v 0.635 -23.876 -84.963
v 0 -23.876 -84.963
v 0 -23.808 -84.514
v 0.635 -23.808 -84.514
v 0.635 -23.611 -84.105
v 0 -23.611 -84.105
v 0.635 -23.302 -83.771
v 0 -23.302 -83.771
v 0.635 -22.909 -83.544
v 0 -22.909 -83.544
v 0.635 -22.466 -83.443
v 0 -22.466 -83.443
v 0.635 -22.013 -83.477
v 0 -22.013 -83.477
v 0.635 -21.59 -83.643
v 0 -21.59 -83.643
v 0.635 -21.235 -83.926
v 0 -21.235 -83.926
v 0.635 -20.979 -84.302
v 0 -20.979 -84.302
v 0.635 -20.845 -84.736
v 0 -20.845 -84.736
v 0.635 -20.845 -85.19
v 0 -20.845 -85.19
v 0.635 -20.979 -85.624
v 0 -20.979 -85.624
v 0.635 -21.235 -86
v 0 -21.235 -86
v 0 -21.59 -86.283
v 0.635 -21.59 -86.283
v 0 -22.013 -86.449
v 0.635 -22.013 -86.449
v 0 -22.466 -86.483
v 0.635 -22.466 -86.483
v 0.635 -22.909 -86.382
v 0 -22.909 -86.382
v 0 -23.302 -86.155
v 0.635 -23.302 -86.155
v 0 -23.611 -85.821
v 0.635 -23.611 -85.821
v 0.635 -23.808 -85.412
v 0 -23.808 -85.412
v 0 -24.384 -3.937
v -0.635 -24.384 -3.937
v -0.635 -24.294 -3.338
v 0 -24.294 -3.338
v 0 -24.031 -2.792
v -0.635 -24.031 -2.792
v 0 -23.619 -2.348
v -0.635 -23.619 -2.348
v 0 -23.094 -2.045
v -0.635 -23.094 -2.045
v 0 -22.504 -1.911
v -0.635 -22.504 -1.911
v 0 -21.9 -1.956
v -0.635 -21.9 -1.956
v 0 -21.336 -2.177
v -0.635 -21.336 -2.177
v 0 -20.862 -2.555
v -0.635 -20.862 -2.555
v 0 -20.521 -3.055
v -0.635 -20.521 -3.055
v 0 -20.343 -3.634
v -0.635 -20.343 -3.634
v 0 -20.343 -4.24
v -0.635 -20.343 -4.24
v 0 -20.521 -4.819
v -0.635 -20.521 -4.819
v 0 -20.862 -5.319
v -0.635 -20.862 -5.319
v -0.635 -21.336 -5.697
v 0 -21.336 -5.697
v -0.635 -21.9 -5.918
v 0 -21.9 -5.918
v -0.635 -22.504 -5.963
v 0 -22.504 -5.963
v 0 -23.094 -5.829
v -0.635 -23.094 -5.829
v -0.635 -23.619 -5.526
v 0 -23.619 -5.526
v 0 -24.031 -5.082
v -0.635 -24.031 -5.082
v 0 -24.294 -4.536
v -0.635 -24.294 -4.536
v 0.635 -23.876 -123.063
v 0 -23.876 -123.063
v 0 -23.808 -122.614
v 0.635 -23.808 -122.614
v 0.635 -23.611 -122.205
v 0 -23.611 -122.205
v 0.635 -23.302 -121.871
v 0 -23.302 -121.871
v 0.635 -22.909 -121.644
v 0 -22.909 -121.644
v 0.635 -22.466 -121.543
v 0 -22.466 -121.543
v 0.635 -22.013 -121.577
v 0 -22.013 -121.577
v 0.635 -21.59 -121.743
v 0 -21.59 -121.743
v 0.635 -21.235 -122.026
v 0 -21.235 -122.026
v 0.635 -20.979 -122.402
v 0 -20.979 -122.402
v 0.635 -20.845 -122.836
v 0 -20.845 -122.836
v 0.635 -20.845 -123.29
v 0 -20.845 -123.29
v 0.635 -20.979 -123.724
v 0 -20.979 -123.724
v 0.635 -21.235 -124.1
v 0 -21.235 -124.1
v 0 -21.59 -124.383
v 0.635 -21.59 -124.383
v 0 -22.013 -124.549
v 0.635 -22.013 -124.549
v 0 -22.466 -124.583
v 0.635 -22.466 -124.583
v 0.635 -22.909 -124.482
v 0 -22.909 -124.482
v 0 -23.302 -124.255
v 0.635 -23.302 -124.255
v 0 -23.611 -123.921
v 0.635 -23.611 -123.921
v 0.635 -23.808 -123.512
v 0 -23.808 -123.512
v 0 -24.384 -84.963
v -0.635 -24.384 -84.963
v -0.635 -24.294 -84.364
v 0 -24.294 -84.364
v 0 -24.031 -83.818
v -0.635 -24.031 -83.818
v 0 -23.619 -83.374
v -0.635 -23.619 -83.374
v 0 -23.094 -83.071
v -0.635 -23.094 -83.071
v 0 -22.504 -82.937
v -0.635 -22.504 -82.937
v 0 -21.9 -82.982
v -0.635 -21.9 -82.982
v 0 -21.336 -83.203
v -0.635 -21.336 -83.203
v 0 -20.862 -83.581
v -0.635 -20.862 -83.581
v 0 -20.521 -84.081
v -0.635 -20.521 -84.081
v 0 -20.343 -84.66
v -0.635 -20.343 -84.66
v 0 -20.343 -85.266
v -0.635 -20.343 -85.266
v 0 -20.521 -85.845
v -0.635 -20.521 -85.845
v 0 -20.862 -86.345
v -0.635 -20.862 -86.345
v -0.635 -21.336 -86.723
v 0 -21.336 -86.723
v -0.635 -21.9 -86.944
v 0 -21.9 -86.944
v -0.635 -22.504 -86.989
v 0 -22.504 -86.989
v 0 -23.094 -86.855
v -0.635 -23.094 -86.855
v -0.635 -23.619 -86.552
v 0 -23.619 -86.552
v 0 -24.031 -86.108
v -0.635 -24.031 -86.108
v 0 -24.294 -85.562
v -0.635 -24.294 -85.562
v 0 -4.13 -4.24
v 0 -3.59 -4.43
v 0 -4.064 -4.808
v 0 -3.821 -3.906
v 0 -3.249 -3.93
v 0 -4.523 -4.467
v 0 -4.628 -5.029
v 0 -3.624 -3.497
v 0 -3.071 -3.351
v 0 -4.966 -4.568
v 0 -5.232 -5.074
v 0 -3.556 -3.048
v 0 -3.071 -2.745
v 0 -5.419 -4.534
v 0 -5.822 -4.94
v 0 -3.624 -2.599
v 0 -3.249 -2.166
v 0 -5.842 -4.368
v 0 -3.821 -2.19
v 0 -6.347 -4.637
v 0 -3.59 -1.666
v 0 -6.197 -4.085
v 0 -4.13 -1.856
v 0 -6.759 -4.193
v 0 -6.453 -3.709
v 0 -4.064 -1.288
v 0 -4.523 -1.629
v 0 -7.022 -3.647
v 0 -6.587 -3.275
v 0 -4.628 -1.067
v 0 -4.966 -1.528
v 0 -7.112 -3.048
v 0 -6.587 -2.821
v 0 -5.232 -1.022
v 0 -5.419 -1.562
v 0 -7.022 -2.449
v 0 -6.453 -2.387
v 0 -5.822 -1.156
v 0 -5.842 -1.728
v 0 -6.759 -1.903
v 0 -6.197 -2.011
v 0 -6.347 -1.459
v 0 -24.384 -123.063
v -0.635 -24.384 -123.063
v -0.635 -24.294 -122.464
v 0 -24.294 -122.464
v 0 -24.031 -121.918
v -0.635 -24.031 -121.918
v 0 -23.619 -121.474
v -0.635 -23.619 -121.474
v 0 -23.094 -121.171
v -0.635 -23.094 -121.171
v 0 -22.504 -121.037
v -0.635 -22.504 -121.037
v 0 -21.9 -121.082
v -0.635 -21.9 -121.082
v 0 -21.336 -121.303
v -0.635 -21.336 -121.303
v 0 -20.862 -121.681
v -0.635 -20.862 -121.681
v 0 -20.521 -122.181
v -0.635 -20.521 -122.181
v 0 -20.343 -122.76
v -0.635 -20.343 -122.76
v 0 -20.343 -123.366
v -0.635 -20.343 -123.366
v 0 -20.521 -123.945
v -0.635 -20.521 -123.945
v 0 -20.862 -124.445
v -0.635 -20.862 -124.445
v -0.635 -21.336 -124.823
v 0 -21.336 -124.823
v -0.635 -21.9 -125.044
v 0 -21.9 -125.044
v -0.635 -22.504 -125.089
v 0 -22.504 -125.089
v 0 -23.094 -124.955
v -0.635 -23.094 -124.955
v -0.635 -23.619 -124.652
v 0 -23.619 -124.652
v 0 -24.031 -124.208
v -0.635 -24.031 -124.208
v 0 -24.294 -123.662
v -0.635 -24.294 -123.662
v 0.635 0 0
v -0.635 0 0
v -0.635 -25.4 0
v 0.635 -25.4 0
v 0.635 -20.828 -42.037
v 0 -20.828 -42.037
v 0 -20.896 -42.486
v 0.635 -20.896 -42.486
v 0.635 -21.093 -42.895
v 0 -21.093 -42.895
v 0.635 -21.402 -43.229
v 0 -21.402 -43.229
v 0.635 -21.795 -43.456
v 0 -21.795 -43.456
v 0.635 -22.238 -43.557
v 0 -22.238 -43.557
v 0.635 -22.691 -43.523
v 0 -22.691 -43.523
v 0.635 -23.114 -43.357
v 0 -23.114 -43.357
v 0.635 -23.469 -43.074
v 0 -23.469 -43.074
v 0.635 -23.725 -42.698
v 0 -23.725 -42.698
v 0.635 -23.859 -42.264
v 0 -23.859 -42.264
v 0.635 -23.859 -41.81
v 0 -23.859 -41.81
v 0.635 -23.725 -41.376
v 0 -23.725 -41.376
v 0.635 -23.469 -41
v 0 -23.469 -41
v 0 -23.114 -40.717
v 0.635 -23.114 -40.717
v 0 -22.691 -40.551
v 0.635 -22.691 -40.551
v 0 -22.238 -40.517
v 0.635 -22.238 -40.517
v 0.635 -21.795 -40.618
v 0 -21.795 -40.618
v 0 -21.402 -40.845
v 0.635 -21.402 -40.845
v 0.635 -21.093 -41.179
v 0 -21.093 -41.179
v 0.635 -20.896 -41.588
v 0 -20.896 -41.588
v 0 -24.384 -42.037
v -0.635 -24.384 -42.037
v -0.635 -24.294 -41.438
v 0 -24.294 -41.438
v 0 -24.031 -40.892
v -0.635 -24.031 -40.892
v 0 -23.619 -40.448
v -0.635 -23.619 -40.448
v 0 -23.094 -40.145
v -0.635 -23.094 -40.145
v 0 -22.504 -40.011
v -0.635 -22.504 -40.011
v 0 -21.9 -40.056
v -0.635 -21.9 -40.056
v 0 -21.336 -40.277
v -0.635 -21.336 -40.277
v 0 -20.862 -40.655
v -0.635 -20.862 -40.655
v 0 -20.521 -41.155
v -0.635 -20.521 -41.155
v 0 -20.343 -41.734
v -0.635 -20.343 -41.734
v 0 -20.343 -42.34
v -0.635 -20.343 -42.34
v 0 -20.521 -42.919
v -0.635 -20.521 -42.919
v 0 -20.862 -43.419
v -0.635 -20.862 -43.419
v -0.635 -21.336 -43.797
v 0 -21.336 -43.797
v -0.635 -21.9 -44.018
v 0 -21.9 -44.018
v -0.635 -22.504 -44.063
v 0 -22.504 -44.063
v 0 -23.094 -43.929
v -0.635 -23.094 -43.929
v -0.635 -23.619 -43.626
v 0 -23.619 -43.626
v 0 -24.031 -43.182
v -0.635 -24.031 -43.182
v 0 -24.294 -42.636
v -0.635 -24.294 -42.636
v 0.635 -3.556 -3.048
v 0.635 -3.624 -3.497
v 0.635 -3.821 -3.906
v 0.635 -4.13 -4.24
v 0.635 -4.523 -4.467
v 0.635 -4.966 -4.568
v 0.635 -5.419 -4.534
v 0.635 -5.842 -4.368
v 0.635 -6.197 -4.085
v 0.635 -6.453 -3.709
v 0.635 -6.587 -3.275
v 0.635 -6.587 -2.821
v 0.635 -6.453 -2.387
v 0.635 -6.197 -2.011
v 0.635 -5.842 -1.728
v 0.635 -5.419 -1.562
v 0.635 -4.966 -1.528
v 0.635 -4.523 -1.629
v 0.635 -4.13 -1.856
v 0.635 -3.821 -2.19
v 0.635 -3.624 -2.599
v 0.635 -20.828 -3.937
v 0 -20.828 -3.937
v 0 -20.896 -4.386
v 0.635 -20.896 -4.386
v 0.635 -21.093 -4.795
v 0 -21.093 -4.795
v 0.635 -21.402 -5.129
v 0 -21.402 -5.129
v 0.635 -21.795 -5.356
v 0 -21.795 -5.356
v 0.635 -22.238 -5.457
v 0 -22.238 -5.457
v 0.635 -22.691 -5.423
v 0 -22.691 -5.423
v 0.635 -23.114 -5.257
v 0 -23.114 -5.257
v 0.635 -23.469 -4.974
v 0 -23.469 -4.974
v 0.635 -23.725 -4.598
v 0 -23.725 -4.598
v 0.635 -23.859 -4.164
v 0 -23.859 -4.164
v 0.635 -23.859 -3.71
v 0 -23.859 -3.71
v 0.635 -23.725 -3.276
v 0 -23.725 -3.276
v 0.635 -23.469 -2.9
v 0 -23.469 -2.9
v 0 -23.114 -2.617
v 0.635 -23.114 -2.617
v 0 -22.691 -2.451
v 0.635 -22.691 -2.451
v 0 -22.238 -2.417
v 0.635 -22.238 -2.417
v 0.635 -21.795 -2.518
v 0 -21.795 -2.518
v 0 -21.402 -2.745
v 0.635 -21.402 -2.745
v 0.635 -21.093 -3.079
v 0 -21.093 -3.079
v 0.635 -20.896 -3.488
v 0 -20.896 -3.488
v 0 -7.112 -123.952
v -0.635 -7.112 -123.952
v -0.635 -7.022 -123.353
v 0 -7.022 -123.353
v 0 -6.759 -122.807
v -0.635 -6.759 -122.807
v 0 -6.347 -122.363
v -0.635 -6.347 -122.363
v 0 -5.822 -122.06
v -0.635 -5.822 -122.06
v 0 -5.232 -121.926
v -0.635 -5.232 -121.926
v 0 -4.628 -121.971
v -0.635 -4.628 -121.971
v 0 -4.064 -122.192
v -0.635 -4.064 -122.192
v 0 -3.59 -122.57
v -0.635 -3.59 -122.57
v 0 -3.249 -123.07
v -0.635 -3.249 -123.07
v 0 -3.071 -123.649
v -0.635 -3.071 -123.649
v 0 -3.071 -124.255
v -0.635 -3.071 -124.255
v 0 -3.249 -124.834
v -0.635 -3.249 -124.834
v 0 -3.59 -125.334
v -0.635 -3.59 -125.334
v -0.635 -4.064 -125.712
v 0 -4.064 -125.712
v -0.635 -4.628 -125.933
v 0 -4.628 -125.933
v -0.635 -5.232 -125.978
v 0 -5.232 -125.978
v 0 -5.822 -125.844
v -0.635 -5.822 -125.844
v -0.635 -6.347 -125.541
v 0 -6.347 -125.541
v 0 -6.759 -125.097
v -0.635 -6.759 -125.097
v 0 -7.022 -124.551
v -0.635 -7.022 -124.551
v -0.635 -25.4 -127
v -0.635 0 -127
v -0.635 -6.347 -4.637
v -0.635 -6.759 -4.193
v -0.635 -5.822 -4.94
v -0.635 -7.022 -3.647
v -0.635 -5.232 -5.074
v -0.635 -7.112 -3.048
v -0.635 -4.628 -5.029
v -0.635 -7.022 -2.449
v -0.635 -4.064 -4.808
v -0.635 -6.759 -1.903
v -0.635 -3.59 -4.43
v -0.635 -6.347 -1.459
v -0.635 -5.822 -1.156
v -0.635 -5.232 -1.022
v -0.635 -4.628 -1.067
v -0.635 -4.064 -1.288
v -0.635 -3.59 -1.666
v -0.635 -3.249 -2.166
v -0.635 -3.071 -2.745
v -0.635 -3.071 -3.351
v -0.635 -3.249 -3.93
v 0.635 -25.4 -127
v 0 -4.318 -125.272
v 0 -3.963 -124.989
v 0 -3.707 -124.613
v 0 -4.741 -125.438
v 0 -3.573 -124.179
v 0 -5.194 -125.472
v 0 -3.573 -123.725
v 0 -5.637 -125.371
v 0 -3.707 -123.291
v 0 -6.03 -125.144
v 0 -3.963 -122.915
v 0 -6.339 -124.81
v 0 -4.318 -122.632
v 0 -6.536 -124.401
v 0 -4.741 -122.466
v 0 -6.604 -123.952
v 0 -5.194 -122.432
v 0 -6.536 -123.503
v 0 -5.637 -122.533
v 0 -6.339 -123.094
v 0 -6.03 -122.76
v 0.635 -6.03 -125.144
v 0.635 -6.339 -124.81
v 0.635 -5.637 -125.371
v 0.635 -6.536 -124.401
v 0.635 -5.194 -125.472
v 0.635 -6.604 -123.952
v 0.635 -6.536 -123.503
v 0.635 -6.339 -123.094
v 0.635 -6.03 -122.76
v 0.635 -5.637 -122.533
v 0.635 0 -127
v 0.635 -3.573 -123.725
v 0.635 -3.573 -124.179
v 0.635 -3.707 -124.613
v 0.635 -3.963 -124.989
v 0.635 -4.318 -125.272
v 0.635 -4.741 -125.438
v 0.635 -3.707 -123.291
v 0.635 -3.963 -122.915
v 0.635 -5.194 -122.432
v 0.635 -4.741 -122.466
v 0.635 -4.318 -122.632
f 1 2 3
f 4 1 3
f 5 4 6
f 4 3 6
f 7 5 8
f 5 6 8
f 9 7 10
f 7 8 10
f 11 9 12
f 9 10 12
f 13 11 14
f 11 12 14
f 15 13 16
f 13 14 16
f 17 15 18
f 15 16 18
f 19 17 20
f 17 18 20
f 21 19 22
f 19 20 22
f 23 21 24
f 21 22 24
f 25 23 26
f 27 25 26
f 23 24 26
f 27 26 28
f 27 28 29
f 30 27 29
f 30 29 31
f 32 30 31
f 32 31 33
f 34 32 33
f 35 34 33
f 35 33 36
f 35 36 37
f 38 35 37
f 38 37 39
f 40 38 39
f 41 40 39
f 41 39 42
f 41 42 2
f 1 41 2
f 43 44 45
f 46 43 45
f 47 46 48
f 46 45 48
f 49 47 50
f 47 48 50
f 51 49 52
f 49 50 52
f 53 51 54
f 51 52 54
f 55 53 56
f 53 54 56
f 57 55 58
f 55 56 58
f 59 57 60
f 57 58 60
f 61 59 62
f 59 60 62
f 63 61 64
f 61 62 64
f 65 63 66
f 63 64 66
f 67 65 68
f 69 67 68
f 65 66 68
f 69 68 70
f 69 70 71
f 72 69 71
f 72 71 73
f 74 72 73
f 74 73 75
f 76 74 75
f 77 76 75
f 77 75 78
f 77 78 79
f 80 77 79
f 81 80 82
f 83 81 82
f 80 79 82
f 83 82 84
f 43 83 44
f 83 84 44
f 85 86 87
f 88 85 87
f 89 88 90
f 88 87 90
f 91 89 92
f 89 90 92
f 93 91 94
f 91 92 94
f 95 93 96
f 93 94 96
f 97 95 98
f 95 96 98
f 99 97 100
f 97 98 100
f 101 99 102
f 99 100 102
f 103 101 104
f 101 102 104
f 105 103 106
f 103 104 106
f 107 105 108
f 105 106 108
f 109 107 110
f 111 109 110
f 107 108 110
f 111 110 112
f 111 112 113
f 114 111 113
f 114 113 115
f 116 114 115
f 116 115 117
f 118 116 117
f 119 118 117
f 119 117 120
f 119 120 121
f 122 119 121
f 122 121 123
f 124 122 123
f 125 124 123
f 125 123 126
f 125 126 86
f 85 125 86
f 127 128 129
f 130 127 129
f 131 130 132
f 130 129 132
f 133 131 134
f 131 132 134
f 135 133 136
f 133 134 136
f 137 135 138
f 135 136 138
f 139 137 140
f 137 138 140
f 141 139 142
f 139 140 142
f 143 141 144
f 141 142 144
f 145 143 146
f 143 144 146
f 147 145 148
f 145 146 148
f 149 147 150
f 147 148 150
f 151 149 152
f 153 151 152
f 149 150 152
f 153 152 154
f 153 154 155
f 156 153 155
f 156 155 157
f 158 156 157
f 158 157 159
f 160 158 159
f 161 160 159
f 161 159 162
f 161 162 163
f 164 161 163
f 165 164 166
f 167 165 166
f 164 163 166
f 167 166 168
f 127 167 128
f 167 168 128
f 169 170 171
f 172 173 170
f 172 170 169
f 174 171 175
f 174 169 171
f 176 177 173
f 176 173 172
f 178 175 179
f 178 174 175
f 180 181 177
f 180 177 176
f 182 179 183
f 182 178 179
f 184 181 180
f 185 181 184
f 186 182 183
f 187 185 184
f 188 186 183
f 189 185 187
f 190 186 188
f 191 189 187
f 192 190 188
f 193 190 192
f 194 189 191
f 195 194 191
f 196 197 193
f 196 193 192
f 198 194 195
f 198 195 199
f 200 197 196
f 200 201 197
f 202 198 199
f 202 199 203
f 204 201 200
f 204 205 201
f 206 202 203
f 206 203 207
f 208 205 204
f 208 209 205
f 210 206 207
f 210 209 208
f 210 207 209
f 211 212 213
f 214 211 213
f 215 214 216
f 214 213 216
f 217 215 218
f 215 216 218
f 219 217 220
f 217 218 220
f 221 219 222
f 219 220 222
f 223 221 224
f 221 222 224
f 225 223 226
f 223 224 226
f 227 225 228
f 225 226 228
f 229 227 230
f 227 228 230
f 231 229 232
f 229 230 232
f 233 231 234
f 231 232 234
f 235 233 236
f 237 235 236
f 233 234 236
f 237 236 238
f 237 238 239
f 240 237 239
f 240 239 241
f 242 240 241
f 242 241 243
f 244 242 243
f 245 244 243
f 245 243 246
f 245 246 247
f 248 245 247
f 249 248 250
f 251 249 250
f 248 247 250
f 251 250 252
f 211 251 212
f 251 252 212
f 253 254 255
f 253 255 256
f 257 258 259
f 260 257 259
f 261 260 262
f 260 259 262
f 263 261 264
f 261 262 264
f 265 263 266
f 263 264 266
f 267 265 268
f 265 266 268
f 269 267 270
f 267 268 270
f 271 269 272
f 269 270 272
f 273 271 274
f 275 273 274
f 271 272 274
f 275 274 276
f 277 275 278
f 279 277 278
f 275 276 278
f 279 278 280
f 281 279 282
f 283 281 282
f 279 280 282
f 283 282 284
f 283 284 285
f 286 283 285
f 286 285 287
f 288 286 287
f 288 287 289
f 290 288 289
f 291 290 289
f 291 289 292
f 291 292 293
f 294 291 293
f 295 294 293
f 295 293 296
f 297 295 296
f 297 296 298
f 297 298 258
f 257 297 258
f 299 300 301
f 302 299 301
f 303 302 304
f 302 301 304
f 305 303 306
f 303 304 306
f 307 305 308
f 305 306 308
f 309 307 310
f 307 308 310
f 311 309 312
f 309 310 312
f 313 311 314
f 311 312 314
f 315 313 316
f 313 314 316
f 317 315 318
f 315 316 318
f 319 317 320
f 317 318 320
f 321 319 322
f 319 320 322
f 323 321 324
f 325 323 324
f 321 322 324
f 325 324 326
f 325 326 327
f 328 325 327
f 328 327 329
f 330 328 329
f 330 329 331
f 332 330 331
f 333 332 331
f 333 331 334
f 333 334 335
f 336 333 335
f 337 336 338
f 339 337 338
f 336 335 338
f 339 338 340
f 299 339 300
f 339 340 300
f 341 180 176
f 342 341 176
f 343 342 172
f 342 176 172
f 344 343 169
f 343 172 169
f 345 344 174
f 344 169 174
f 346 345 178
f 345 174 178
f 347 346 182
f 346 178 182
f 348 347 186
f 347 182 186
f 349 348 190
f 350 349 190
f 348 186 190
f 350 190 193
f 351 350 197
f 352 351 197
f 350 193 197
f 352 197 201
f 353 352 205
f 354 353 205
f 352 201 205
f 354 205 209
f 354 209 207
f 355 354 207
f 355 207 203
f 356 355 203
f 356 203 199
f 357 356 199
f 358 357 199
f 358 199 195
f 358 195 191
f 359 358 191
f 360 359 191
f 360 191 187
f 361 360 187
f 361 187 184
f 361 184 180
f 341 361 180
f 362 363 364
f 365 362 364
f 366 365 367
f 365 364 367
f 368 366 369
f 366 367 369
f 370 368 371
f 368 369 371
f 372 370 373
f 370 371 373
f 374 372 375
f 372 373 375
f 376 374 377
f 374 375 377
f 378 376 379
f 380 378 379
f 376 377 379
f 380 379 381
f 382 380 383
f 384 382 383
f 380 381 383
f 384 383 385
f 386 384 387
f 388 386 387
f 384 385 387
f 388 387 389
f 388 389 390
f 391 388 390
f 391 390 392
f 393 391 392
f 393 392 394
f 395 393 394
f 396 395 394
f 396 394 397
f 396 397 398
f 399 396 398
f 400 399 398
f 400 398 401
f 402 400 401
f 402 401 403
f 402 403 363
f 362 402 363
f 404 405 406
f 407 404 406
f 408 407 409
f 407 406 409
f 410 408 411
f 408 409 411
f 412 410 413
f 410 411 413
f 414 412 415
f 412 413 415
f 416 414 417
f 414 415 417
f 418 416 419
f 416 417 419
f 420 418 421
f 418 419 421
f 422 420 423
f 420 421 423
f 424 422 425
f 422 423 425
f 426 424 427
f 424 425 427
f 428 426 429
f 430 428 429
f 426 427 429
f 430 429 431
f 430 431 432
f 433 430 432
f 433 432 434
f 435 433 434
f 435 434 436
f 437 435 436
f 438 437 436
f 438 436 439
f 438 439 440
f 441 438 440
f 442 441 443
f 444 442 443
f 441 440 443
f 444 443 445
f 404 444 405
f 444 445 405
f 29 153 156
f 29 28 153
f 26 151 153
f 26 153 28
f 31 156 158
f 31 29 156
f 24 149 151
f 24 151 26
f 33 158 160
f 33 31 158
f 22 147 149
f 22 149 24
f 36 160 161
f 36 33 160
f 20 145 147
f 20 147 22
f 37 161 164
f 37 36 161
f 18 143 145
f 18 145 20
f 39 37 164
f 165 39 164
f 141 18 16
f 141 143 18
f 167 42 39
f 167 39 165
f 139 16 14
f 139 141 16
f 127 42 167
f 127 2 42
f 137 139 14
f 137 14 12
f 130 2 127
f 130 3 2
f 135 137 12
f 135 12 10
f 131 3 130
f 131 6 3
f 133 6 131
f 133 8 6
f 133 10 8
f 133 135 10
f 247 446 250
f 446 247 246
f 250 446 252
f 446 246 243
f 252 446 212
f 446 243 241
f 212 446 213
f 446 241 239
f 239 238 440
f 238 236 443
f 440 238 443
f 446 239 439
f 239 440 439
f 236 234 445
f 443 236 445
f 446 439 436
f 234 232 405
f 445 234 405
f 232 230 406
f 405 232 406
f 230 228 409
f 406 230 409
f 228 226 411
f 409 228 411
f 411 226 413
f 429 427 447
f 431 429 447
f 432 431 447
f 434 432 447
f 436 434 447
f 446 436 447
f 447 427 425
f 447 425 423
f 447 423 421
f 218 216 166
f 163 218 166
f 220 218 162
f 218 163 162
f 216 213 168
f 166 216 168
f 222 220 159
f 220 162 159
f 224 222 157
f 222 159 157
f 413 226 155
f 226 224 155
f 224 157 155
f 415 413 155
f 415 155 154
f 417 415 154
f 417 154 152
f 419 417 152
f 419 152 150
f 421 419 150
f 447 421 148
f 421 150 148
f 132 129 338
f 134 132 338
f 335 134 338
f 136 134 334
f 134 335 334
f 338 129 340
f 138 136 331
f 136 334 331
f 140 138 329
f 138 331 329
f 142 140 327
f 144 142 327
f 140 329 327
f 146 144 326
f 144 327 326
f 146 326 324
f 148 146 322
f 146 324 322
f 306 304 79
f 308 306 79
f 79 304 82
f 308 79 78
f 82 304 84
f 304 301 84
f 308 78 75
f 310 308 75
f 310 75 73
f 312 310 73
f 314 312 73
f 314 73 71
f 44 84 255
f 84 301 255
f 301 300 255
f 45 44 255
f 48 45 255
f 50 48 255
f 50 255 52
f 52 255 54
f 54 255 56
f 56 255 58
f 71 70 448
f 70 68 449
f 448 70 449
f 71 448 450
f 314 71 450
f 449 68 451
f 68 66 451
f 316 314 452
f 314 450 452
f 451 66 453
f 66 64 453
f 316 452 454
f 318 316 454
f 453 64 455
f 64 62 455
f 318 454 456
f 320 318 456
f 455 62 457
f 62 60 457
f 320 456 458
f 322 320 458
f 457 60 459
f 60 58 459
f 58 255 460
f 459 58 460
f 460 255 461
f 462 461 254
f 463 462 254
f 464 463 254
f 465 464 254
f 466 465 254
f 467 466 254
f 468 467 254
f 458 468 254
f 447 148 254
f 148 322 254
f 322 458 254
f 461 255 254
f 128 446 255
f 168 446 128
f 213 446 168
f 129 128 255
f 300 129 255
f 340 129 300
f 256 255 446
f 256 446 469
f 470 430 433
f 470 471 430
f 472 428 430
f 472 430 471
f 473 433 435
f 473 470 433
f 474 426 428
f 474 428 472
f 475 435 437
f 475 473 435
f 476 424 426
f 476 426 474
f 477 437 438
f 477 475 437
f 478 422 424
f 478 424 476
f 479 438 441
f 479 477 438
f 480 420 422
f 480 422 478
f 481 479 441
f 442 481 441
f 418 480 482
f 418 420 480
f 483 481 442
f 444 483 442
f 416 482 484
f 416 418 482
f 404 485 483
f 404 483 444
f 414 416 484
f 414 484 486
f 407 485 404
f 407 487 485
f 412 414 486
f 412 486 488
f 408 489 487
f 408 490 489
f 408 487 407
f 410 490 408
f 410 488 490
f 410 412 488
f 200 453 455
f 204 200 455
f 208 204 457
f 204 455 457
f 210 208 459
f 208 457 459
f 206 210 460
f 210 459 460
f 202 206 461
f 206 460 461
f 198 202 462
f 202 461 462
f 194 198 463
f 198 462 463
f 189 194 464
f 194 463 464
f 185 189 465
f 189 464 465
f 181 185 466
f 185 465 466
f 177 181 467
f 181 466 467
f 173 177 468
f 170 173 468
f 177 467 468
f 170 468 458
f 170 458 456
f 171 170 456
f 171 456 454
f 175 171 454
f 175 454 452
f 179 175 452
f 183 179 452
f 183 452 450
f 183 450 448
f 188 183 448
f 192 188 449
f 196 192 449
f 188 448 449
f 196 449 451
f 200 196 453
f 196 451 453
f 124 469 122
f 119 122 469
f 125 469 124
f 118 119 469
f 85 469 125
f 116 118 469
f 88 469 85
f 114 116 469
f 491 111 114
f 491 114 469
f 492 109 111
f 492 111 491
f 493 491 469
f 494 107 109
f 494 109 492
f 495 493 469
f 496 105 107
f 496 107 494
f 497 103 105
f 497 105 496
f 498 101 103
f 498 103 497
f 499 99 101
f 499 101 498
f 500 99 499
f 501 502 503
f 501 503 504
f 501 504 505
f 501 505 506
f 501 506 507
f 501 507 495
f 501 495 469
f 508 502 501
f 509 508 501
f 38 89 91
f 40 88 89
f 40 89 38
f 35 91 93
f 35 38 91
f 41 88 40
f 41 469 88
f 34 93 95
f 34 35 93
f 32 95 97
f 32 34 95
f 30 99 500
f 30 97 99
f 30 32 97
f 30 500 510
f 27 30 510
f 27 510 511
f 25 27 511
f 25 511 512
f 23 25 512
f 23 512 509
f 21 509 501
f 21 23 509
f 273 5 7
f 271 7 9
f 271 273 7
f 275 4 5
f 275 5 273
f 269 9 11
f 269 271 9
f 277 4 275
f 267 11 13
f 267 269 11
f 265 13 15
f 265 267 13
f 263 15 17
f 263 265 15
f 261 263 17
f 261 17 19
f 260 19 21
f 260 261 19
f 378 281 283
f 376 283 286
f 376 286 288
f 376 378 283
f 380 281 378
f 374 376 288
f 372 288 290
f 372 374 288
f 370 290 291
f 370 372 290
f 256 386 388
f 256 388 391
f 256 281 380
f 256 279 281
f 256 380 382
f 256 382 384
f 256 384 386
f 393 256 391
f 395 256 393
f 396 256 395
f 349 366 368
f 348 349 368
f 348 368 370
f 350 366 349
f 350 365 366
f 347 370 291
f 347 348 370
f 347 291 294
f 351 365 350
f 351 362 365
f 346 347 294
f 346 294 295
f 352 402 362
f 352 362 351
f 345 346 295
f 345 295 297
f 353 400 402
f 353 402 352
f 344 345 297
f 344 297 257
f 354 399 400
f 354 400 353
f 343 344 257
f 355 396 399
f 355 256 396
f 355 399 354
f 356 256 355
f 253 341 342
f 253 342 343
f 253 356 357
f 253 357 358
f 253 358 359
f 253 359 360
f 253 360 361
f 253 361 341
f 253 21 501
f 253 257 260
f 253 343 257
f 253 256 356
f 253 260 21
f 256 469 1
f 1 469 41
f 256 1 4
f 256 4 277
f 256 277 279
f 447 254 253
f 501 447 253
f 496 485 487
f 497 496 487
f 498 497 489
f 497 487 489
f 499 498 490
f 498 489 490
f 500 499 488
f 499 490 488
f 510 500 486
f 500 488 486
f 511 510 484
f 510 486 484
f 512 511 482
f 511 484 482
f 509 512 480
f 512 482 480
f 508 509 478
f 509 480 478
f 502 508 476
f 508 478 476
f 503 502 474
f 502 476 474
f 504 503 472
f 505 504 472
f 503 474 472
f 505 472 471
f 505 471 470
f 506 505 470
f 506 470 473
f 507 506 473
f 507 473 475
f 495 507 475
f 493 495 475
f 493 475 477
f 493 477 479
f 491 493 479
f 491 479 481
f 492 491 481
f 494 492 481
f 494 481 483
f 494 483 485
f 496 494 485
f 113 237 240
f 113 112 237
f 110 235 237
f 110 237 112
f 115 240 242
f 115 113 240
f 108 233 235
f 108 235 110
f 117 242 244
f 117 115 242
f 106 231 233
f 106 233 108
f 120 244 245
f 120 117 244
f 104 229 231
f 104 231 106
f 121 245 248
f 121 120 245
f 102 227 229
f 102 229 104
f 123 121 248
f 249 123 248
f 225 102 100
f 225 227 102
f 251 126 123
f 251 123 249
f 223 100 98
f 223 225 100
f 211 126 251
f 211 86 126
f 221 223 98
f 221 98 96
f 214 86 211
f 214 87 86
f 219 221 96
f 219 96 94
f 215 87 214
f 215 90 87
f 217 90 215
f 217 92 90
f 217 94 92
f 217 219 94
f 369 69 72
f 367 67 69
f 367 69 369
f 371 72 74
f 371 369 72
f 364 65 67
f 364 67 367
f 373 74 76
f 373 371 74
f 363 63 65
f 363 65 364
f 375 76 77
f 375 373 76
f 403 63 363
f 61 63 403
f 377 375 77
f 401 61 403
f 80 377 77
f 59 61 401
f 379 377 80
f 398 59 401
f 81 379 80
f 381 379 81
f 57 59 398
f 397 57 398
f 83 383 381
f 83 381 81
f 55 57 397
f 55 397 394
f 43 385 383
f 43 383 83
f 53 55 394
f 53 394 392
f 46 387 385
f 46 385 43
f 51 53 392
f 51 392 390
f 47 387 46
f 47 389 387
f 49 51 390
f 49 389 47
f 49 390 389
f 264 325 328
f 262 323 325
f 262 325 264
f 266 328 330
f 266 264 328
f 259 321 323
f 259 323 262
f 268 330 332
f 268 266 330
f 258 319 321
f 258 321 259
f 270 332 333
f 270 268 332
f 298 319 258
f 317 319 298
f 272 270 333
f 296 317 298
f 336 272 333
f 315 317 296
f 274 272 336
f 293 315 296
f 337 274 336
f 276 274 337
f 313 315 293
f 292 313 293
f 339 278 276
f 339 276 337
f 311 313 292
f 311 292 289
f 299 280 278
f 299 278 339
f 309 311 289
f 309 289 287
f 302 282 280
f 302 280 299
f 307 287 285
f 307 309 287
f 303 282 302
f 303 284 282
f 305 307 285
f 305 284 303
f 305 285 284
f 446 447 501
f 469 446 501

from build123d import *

# Parameters (mm, degrees)
SKETCH3_W           = 1.27
SKETCH3_H           = 25.4
BOSS_EXTRUDE1_DEPTH = 127
SKETCH5_R           = 1.524
CUT_EXTRUDE1_DEPTH  = 1.27
SKETCH6_R           = 2.032
SKETCH6_R_2         = 1.524
CUT_EXTRUDE3_DEPTH  = 0.635


with BuildPart() as part:
    # Sketch3 → Boss-Extrude1 (new body)
    with BuildSketch(Plane.XY):
        with Locations((0, -12.7)):
            Rectangle(SKETCH3_W, SKETCH3_H)
    extrude(amount=-BOSS_EXTRUDE1_DEPTH)

    # Sketch5 → Cut-Extrude1 (cut)
    with BuildSketch(Plane.ZY.offset(0.635)):
        with Locations(Location((-123.063, -22.352, 0), (0, 0, 270))):
            Circle(SKETCH5_R)
        with Locations(Location((-84.963, -22.352, 0), (0, 0, 270))):
            Circle(SKETCH5_R)
        with Locations(Location((-123.952, -5.08, 0), (0, 0, 270))):
            Circle(SKETCH5_R)
        with Locations(Location((-42.037, -22.352, 0), (0, 0, 90))):
            Circle(SKETCH5_R)
        with Locations(Location((-3.937, -22.352, 0), (0, 0, 90))):
            Circle(SKETCH5_R)
        with Locations(Location((-3.048, -5.08, 0), (0, 0, 90))):
            Circle(SKETCH5_R)
    extrude(amount=-CUT_EXTRUDE1_DEPTH, mode=Mode.SUBTRACT)

    # Sketch6 → Cut-Extrude3 (cut)
    # profile 1 of 6: a face of its own
    with BuildSketch(Plane.ZY.offset(0.635)):
        with Locations(Location((-123.063, -22.352, 0), (0, 0, 270))):
            Circle(SKETCH6_R)
        with Locations(Location((-123.063, -22.352, 0), (0, 0, 270))):
            Circle(SKETCH6_R_2, mode=Mode.SUBTRACT)
    # profile 2 of 6: a face of its own
    with BuildSketch(Plane.ZY.offset(0.635)):
        with Locations(Location((-84.963, -22.352, 0), (0, 0, 270))):
            Circle(SKETCH6_R)
        with Locations(Location((-84.963, -22.352, 0), (0, 0, 270))):
            Circle(SKETCH6_R_2, mode=Mode.SUBTRACT)
    # profile 3 of 6: a face of its own
    with BuildSketch(Plane.ZY.offset(0.635)):
        with Locations(Location((-42.037, -22.352, 0), (0, 0, 270))):
            Circle(SKETCH6_R)
        with Locations(Location((-42.037, -22.352, 0), (0, 0, 270))):
            Circle(SKETCH6_R_2, mode=Mode.SUBTRACT)
    # profile 4 of 6: a face of its own
    with BuildSketch(Plane.ZY.offset(0.635)):
        with Locations(Location((-3.937, -22.352, 0), (0, 0, 270))):
            Circle(SKETCH6_R)
        with Locations(Location((-3.937, -22.352, 0), (0, 0, 270))):
            Circle(SKETCH6_R_2, mode=Mode.SUBTRACT)
    # profile 5 of 6: a face of its own
    with BuildSketch(Plane.ZY.offset(0.635)):
        with Locations(Location((-3.048, -5.08, 0), (0, 0, 270))):
            Circle(SKETCH6_R)
        with Locations(Location((-3.048, -5.08, 0), (0, 0, 270))):
            Circle(SKETCH6_R_2, mode=Mode.SUBTRACT)
    # profile 6 of 6: a face of its own
    with BuildSketch(Plane.ZY.offset(0.635)):
        with Locations(Location((-123.952, -5.08, 0), (0, 0, 270))):
            Circle(SKETCH6_R)
    extrude(amount=-CUT_EXTRUDE3_DEPTH, mode=Mode.SUBTRACT)


solid = part.part
